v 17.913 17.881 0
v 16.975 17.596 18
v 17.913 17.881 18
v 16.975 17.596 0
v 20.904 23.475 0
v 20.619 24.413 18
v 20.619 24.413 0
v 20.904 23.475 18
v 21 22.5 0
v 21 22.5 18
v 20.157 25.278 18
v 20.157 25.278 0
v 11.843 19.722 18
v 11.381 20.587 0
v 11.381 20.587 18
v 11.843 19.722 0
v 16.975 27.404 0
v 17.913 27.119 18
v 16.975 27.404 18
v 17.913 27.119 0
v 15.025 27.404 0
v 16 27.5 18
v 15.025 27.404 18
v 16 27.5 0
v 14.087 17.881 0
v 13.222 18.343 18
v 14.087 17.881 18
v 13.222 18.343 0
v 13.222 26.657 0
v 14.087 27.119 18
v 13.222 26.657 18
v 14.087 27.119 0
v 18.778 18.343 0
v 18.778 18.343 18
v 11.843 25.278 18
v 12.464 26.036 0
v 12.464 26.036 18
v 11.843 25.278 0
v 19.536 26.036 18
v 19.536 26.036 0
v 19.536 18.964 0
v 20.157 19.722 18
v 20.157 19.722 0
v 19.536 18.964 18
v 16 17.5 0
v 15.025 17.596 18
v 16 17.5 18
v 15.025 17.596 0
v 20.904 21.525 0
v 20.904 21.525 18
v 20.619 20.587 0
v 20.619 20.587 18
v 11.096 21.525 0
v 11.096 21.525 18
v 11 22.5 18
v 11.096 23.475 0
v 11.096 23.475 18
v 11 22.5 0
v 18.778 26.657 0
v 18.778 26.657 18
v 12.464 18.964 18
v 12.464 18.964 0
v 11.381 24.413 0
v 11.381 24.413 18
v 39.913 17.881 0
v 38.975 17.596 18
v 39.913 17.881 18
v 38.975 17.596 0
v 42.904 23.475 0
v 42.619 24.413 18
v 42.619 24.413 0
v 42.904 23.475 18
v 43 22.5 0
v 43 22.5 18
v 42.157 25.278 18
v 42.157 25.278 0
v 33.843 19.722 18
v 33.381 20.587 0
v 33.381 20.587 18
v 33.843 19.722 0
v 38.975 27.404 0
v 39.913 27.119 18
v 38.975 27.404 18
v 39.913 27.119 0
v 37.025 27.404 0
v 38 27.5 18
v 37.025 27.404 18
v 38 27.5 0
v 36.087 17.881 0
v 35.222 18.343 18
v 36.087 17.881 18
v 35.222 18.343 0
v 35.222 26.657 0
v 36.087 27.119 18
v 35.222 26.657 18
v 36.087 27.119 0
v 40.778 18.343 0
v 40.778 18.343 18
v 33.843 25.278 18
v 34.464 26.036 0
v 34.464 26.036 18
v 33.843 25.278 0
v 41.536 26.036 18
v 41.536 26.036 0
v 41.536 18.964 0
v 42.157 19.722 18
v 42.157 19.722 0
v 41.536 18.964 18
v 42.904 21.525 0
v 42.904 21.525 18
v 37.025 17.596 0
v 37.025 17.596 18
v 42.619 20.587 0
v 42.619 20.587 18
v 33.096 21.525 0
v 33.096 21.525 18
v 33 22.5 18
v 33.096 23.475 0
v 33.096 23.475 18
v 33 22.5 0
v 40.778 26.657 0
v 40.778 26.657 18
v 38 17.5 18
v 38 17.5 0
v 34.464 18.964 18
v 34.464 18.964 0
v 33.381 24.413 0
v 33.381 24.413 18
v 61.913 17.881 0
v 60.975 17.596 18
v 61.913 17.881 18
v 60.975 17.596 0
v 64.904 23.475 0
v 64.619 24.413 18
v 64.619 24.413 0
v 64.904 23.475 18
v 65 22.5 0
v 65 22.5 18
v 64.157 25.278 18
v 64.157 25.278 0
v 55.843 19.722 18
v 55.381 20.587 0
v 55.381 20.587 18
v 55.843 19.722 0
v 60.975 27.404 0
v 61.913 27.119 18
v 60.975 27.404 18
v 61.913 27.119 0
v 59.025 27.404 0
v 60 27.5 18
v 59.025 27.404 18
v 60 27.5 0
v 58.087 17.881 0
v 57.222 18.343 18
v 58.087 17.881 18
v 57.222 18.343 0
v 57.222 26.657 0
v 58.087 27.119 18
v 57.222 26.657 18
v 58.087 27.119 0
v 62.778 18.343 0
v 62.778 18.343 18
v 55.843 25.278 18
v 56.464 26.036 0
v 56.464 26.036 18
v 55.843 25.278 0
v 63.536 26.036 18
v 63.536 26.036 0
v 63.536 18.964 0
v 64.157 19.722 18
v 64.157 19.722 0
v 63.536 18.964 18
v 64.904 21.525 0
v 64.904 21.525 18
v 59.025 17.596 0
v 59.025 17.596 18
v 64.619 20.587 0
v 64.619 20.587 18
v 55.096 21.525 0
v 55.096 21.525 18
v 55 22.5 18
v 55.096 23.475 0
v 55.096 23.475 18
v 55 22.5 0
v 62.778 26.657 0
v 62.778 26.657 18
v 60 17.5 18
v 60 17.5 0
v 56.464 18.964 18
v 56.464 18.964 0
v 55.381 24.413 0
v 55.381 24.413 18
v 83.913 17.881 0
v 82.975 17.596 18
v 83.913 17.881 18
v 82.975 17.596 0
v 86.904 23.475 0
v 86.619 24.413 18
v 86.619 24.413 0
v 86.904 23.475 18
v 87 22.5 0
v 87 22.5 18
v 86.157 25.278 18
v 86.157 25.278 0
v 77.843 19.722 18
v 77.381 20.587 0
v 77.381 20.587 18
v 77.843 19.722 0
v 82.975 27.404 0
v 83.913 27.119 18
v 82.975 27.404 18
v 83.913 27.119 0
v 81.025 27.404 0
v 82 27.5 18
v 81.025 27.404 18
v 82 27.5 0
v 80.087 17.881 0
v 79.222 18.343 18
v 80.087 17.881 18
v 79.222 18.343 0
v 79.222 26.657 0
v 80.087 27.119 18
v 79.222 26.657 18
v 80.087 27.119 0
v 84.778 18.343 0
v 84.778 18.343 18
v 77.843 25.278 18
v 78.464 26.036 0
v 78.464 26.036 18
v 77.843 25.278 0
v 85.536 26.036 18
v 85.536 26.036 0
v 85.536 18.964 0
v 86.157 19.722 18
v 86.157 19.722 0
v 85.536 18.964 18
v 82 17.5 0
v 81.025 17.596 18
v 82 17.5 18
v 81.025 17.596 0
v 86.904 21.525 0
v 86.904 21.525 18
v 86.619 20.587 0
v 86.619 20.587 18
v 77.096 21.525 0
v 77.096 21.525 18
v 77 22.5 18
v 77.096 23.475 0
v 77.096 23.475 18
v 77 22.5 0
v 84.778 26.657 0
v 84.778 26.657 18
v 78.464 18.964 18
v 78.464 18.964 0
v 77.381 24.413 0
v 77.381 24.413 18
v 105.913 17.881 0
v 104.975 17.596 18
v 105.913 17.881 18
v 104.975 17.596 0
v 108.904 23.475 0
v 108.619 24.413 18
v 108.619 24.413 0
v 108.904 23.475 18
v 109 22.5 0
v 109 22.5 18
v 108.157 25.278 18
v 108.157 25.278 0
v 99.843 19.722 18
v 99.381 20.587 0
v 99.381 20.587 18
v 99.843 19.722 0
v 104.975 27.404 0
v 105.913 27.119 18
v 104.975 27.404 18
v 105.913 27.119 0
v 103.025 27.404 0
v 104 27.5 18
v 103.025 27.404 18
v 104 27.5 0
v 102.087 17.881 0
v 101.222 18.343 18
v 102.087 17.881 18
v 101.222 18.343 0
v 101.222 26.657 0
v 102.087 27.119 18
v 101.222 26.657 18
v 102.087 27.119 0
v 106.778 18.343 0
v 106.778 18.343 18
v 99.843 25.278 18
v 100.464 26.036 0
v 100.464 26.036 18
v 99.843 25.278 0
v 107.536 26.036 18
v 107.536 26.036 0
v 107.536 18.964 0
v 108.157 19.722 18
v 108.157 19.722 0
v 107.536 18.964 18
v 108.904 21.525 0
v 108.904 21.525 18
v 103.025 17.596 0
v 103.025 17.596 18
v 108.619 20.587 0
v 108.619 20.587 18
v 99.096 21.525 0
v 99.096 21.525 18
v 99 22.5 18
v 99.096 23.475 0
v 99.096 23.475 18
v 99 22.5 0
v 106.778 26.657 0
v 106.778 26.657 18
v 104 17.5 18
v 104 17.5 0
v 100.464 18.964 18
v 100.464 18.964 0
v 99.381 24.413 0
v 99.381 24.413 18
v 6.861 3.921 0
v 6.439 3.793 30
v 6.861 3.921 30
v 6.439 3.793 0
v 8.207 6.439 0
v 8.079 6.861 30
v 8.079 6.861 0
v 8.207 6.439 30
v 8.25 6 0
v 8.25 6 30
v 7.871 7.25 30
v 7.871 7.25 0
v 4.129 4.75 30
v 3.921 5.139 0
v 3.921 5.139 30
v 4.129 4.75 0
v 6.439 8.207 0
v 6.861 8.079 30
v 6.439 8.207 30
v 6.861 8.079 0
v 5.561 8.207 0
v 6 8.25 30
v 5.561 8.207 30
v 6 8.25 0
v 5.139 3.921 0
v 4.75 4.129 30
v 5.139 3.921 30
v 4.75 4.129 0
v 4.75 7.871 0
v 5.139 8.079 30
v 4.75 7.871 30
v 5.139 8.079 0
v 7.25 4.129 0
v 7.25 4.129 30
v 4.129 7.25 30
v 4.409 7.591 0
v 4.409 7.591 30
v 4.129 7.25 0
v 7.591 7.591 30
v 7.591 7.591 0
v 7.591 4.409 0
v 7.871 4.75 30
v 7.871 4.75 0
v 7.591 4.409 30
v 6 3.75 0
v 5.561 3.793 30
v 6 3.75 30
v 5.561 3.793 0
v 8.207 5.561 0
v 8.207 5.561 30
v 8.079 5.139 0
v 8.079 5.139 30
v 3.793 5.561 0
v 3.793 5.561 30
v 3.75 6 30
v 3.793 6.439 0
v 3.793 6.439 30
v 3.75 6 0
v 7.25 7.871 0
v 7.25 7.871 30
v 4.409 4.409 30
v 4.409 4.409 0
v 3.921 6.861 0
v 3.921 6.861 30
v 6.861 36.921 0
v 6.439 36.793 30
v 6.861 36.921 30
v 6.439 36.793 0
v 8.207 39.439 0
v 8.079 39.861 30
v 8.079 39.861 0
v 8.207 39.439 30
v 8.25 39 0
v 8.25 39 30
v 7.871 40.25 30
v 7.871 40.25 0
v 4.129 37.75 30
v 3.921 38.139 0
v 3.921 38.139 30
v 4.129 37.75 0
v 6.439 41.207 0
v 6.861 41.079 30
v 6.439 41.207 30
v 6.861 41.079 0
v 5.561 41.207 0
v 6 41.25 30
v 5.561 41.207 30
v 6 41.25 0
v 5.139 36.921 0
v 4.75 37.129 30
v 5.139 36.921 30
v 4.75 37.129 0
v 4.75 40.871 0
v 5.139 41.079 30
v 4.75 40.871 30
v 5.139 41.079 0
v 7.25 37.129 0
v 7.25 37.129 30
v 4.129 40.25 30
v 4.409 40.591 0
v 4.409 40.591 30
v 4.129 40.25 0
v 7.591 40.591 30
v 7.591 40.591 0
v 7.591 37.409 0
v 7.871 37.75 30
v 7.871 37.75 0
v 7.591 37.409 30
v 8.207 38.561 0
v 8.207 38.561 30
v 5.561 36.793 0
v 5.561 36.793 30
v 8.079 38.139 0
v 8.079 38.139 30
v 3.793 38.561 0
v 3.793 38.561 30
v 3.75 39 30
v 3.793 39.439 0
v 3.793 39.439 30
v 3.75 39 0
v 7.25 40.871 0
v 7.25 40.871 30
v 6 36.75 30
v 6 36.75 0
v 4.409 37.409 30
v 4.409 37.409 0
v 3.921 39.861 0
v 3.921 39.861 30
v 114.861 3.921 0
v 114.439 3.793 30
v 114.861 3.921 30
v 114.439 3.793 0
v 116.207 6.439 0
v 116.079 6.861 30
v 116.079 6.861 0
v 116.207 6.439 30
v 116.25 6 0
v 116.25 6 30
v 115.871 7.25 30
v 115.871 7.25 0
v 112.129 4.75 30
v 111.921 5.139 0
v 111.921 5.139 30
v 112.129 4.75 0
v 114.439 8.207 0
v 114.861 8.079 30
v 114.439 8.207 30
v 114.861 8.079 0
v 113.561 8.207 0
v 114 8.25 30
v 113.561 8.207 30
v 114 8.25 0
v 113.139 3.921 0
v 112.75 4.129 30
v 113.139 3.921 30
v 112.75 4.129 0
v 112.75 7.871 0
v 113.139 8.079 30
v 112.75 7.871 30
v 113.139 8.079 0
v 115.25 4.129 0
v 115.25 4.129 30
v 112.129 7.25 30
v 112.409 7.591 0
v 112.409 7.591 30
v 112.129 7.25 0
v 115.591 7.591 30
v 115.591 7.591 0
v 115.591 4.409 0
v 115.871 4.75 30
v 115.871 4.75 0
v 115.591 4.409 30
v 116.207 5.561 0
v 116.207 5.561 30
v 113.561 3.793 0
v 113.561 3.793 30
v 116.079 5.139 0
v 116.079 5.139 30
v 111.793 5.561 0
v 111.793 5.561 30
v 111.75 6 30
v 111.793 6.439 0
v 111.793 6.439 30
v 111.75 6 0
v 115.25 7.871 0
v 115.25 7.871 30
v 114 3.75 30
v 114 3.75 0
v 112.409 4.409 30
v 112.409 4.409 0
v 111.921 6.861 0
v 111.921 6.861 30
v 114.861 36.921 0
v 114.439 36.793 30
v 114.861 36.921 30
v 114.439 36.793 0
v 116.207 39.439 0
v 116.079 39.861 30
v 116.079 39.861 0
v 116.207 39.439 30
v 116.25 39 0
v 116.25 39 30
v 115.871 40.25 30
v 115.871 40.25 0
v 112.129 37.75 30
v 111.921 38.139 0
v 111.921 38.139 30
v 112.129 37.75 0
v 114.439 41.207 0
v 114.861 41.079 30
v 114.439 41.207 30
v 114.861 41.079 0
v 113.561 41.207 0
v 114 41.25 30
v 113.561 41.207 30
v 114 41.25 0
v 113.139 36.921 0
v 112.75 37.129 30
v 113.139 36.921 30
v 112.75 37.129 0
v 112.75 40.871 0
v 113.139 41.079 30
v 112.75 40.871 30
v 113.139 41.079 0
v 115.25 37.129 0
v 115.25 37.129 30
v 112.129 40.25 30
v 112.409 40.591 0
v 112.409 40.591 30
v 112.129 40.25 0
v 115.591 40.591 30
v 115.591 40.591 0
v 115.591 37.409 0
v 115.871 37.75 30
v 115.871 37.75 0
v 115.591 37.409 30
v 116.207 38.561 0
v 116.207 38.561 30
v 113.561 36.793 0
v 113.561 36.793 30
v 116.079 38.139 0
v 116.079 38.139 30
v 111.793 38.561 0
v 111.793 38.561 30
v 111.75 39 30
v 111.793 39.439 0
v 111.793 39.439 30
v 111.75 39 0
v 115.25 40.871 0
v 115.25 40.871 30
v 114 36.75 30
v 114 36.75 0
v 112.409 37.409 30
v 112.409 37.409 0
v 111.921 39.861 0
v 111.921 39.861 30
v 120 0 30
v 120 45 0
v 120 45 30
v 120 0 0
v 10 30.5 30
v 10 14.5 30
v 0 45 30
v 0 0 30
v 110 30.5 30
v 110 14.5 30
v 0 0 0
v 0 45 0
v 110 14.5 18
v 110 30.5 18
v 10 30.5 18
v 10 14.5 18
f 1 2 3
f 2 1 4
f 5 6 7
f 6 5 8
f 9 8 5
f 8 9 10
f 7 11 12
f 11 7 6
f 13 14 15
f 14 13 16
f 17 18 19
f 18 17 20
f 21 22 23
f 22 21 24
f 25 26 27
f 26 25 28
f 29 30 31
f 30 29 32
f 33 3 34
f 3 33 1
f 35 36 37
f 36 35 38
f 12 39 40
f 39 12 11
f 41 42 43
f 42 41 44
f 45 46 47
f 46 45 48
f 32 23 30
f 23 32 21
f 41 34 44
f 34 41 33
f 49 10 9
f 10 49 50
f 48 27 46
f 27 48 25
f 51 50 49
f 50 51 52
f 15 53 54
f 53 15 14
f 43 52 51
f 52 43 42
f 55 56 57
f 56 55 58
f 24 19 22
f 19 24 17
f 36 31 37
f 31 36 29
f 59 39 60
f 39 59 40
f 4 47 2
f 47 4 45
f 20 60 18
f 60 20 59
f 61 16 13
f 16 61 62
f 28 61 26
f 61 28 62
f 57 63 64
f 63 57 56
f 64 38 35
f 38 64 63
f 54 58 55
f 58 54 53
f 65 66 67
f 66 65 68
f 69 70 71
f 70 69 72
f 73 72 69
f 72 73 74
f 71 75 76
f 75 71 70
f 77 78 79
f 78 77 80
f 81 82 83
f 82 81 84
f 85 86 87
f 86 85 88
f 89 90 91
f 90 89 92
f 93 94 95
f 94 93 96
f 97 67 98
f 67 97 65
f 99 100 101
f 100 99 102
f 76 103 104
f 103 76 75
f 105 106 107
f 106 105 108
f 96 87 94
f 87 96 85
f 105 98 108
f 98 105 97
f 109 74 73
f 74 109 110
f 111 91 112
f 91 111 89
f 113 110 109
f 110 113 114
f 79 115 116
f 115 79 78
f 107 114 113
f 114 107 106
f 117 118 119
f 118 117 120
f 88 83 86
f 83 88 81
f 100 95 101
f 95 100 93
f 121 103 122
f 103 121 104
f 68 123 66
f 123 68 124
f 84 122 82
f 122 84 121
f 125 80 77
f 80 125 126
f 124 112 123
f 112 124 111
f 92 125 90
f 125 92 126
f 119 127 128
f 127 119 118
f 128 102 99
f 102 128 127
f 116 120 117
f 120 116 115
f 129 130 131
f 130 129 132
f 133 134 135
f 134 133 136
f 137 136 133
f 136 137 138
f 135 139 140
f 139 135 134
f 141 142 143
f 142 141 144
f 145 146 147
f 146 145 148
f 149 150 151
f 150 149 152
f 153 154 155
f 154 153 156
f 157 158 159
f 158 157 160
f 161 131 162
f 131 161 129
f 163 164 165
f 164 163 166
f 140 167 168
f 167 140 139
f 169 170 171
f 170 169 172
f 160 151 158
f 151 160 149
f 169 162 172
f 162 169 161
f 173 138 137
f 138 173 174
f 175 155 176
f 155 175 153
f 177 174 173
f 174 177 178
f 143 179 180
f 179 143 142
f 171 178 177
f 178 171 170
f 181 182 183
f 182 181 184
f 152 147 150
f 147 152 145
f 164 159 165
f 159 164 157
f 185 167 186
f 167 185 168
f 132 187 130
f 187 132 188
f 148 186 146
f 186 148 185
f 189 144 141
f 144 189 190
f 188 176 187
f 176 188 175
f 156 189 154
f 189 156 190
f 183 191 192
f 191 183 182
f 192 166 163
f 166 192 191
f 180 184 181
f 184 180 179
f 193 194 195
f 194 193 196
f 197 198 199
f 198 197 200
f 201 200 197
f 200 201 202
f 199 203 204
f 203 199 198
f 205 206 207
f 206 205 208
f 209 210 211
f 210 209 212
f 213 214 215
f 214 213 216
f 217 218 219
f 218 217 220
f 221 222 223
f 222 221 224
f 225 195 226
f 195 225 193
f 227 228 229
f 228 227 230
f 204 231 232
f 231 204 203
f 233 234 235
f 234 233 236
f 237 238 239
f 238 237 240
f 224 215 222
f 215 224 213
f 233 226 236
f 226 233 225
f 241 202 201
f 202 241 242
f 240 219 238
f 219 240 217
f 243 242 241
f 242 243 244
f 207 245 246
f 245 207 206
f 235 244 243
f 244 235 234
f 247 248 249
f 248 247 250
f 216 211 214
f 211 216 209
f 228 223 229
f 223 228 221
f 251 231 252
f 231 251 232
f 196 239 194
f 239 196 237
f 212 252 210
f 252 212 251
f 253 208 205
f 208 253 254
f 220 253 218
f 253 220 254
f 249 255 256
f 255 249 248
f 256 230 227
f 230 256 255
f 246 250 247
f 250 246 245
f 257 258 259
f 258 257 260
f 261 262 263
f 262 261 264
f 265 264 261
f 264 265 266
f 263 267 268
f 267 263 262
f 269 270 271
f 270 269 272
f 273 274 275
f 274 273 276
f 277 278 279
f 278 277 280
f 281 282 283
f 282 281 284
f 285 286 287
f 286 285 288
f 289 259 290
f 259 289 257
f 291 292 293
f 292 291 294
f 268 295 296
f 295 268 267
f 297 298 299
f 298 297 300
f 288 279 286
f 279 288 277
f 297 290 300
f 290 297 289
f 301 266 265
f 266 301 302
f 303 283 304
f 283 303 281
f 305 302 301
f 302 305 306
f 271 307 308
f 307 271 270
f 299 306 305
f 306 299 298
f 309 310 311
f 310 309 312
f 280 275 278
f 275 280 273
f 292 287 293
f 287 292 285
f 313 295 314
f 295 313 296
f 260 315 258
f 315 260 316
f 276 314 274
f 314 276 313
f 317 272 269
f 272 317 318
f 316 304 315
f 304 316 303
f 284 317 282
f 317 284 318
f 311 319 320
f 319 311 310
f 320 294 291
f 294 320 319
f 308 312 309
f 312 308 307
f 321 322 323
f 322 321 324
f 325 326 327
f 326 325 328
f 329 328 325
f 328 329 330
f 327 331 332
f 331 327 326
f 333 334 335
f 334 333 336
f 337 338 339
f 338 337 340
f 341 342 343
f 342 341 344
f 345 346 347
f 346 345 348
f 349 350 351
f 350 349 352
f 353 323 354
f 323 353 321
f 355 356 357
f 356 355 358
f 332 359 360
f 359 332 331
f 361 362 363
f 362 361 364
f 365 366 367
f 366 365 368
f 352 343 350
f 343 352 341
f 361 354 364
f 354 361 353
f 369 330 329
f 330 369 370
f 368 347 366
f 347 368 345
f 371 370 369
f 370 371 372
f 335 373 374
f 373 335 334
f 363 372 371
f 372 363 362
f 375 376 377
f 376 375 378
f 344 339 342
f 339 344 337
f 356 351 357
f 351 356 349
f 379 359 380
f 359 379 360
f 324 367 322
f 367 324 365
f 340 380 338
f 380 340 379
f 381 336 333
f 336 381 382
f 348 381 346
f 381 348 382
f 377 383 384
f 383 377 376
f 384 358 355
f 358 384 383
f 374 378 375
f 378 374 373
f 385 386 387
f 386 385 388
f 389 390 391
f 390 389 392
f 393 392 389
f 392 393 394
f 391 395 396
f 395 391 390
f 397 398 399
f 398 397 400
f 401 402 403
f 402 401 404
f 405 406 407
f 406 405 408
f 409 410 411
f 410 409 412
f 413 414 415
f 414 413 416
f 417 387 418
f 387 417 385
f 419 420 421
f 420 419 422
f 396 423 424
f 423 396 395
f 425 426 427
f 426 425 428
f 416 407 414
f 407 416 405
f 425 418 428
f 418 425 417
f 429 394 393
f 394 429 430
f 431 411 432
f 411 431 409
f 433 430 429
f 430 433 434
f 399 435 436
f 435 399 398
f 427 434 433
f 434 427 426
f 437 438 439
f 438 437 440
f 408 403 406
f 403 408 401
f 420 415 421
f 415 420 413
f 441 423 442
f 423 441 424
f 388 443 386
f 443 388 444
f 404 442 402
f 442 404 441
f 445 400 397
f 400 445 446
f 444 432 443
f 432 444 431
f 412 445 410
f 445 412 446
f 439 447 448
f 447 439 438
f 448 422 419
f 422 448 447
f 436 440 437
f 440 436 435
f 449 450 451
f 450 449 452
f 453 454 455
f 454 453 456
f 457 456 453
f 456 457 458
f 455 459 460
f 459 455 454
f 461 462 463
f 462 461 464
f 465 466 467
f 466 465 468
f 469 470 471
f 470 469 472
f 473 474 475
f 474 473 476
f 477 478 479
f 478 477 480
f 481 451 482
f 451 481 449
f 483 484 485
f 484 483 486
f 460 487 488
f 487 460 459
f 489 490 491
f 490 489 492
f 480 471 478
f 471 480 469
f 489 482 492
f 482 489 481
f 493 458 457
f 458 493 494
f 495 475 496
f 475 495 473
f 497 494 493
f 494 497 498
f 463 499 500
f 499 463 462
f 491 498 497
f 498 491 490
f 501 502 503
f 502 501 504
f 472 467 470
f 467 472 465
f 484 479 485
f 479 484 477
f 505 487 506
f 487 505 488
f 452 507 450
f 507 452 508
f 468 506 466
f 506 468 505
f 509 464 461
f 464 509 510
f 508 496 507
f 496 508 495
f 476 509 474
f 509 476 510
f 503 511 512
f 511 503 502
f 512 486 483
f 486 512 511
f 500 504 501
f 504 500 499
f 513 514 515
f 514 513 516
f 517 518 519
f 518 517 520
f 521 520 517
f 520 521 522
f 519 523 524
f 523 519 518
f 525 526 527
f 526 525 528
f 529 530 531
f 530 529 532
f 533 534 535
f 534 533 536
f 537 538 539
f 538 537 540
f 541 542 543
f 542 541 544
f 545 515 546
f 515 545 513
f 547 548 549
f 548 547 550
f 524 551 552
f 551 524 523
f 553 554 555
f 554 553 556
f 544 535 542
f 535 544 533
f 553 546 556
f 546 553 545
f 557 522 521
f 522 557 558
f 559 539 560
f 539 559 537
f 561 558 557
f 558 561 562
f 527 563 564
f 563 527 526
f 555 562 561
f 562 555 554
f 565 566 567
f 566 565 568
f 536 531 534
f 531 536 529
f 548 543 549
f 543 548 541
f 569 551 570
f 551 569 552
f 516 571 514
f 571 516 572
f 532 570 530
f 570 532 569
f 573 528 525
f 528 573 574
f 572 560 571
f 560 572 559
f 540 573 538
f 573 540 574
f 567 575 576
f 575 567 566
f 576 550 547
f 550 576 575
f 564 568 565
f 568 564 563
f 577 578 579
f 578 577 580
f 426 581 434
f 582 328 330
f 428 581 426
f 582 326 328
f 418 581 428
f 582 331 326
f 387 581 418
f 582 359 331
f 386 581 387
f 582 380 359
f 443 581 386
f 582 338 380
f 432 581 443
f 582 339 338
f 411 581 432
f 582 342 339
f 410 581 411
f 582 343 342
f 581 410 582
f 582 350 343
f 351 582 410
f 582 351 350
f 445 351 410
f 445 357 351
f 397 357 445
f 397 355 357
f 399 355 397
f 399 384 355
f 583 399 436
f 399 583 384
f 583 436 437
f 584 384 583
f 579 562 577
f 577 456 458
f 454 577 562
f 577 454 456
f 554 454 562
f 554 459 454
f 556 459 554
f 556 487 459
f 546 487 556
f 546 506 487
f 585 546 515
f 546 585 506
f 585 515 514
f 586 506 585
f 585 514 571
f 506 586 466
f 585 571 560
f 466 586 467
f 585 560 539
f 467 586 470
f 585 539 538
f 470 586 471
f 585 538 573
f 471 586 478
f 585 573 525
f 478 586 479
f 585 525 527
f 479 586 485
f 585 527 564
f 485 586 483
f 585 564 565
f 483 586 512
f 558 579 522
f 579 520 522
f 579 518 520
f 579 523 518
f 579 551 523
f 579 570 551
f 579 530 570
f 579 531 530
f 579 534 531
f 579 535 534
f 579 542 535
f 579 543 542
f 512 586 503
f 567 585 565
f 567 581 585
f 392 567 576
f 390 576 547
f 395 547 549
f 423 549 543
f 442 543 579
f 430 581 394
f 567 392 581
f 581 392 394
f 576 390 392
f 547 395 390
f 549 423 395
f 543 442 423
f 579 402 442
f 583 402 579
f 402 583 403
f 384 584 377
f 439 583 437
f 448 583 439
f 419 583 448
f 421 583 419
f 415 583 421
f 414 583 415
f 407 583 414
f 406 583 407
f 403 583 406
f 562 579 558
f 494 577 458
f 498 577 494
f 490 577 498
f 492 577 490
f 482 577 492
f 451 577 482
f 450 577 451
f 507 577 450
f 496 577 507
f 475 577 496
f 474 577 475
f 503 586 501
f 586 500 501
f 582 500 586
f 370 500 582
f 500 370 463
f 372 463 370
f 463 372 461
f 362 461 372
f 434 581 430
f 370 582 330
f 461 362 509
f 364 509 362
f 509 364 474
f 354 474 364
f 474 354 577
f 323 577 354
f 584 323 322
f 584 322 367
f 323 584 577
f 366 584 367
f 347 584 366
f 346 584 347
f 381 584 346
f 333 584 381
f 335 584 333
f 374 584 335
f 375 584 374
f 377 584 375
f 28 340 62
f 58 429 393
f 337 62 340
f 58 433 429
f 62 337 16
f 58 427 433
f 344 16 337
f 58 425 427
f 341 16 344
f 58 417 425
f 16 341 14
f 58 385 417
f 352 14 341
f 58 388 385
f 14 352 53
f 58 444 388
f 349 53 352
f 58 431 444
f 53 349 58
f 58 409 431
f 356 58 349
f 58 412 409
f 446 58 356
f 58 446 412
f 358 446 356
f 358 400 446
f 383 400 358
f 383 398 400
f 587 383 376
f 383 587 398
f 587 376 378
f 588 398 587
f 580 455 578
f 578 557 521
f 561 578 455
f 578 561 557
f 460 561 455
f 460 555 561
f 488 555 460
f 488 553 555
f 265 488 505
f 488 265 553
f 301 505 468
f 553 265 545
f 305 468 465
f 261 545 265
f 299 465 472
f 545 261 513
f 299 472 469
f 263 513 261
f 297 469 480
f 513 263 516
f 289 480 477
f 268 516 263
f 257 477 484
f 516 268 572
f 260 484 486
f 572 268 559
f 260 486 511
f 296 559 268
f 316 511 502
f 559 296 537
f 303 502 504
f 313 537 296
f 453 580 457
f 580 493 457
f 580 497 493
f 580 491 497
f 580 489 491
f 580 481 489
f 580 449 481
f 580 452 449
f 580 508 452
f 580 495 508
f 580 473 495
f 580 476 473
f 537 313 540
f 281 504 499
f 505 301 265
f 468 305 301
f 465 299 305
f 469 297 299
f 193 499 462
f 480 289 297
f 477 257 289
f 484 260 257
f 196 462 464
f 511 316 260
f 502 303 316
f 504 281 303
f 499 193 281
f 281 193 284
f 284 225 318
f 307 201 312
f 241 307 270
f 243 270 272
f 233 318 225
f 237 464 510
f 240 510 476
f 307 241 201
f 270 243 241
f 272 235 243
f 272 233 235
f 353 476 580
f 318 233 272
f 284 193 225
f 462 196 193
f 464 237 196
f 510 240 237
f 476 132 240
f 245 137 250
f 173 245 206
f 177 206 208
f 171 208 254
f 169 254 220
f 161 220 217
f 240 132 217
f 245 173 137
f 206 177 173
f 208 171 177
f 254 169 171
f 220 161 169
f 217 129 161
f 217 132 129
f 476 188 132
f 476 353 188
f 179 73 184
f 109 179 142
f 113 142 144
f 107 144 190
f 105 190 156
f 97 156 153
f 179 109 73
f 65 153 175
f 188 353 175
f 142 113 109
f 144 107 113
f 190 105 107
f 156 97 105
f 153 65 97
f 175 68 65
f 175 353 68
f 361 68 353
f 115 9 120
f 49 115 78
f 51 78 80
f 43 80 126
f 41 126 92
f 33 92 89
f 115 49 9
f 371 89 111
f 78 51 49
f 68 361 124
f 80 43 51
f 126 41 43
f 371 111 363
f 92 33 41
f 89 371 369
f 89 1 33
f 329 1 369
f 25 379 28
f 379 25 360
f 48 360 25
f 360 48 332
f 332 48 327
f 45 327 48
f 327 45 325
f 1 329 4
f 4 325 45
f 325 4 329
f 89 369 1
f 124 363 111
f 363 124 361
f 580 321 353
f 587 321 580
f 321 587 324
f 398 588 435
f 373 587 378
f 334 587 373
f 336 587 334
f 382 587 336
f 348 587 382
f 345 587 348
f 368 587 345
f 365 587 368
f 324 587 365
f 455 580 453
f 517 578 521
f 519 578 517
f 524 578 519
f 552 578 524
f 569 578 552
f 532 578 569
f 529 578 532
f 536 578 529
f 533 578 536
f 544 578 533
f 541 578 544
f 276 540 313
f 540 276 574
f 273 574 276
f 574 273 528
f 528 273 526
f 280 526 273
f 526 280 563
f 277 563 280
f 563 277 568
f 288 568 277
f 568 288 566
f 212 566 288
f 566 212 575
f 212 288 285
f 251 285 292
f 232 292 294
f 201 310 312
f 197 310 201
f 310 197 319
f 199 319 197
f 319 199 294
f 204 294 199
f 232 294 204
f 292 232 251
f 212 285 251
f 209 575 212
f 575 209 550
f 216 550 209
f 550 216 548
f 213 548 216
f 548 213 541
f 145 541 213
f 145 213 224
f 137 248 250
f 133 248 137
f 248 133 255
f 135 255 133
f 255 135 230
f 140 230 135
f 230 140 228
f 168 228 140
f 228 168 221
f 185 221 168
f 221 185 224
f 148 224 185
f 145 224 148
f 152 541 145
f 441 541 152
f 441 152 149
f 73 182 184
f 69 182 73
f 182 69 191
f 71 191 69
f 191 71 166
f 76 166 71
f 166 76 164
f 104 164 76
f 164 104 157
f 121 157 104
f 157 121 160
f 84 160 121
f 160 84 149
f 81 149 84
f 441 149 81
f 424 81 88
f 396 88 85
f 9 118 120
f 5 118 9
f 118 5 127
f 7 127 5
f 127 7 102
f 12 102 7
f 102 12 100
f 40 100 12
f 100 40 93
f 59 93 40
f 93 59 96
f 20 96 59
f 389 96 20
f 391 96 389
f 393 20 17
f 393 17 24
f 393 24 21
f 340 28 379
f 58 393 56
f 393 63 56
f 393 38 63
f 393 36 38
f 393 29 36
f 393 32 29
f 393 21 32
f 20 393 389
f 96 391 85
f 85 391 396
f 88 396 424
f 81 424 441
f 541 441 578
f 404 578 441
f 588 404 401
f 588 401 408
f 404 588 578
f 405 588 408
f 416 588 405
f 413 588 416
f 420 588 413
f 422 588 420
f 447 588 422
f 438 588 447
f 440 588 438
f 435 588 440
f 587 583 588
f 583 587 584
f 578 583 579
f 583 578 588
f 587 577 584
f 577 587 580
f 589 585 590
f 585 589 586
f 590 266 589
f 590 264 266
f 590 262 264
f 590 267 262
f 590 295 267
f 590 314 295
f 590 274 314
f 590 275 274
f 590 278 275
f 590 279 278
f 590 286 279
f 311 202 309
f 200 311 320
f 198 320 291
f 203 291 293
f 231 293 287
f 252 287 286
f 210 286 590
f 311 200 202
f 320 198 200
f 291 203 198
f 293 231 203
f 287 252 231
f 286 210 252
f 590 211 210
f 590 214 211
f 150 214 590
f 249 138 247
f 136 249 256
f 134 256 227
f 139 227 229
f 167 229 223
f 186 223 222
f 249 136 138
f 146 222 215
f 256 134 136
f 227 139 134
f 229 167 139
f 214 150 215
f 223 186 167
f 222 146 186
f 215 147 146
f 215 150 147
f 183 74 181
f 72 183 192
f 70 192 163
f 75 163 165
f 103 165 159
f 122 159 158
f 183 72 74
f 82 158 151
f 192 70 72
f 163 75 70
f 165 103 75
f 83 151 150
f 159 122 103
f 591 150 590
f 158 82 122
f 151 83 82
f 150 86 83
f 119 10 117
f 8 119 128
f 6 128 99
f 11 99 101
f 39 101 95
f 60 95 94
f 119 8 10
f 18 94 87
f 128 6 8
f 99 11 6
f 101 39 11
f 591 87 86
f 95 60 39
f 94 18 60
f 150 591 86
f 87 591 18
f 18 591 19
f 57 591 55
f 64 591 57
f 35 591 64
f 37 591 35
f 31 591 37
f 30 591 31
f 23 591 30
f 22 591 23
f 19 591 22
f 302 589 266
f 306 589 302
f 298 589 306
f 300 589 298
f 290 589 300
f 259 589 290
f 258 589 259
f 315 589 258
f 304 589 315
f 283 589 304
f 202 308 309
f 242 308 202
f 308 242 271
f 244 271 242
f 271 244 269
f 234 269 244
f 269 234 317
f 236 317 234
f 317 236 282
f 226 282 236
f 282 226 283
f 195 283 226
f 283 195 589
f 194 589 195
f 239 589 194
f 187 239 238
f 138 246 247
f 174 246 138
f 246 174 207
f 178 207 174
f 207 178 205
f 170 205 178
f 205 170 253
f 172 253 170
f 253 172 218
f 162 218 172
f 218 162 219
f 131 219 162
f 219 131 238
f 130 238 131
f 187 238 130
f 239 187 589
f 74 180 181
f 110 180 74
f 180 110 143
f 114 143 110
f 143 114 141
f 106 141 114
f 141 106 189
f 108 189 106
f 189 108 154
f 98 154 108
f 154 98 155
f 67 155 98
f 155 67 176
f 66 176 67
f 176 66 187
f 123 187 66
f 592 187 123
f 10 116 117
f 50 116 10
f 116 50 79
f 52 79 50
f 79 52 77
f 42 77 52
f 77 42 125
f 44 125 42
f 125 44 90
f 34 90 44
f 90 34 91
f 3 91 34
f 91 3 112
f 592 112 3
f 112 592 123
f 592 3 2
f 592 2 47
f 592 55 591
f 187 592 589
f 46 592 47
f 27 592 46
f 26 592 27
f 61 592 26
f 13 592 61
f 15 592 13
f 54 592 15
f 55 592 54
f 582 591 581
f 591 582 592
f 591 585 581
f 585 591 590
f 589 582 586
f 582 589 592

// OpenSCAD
$fn = 32;

// ----------------------------------------------------------------------
// Manifold block: gallery_top manifold
// ----------------------------------------------------------------------

// --- parameters (mm) ---
block_l = 120;            // block length, X
block_w = 45;             // block width, Y
block_h = 30;             // block height, Z
port_d = 10;              // port bore diameter
port_pitch = 22;          // port pitch along X
gallery_d = 16;           // top gallery width, Y
gallery_depth = 12;       // gallery pocket depth
wall_p = 10;              // gallery end wall thickness, X
mnt_d = 4.5;              // mounting hole diameter
mnt_in = 6;               // mounting hole inset from the edges

n_ports = 5;  // ports in the row
port_x0 = (block_l - (n_ports - 1) * port_pitch) / 2;  // first port X

difference() {
  cube([block_l, block_w, block_h]);
  for (i = [0 : n_ports - 1])
    translate([port_x0 + i * port_pitch, block_w / 2, -1])
      cylinder(h = block_h + 2, d = port_d);
  translate([wall_p, block_w / 2 - gallery_d / 2, block_h - gallery_depth])
    cube([block_l - 2 * wall_p, gallery_d, gallery_depth + 1]);
  for (cx = [mnt_in, block_l - mnt_in])
    for (cy = [mnt_in, block_w - mnt_in])
      translate([cx, cy, -1]) cylinder(h = block_h + 2, d = mnt_d);
}
